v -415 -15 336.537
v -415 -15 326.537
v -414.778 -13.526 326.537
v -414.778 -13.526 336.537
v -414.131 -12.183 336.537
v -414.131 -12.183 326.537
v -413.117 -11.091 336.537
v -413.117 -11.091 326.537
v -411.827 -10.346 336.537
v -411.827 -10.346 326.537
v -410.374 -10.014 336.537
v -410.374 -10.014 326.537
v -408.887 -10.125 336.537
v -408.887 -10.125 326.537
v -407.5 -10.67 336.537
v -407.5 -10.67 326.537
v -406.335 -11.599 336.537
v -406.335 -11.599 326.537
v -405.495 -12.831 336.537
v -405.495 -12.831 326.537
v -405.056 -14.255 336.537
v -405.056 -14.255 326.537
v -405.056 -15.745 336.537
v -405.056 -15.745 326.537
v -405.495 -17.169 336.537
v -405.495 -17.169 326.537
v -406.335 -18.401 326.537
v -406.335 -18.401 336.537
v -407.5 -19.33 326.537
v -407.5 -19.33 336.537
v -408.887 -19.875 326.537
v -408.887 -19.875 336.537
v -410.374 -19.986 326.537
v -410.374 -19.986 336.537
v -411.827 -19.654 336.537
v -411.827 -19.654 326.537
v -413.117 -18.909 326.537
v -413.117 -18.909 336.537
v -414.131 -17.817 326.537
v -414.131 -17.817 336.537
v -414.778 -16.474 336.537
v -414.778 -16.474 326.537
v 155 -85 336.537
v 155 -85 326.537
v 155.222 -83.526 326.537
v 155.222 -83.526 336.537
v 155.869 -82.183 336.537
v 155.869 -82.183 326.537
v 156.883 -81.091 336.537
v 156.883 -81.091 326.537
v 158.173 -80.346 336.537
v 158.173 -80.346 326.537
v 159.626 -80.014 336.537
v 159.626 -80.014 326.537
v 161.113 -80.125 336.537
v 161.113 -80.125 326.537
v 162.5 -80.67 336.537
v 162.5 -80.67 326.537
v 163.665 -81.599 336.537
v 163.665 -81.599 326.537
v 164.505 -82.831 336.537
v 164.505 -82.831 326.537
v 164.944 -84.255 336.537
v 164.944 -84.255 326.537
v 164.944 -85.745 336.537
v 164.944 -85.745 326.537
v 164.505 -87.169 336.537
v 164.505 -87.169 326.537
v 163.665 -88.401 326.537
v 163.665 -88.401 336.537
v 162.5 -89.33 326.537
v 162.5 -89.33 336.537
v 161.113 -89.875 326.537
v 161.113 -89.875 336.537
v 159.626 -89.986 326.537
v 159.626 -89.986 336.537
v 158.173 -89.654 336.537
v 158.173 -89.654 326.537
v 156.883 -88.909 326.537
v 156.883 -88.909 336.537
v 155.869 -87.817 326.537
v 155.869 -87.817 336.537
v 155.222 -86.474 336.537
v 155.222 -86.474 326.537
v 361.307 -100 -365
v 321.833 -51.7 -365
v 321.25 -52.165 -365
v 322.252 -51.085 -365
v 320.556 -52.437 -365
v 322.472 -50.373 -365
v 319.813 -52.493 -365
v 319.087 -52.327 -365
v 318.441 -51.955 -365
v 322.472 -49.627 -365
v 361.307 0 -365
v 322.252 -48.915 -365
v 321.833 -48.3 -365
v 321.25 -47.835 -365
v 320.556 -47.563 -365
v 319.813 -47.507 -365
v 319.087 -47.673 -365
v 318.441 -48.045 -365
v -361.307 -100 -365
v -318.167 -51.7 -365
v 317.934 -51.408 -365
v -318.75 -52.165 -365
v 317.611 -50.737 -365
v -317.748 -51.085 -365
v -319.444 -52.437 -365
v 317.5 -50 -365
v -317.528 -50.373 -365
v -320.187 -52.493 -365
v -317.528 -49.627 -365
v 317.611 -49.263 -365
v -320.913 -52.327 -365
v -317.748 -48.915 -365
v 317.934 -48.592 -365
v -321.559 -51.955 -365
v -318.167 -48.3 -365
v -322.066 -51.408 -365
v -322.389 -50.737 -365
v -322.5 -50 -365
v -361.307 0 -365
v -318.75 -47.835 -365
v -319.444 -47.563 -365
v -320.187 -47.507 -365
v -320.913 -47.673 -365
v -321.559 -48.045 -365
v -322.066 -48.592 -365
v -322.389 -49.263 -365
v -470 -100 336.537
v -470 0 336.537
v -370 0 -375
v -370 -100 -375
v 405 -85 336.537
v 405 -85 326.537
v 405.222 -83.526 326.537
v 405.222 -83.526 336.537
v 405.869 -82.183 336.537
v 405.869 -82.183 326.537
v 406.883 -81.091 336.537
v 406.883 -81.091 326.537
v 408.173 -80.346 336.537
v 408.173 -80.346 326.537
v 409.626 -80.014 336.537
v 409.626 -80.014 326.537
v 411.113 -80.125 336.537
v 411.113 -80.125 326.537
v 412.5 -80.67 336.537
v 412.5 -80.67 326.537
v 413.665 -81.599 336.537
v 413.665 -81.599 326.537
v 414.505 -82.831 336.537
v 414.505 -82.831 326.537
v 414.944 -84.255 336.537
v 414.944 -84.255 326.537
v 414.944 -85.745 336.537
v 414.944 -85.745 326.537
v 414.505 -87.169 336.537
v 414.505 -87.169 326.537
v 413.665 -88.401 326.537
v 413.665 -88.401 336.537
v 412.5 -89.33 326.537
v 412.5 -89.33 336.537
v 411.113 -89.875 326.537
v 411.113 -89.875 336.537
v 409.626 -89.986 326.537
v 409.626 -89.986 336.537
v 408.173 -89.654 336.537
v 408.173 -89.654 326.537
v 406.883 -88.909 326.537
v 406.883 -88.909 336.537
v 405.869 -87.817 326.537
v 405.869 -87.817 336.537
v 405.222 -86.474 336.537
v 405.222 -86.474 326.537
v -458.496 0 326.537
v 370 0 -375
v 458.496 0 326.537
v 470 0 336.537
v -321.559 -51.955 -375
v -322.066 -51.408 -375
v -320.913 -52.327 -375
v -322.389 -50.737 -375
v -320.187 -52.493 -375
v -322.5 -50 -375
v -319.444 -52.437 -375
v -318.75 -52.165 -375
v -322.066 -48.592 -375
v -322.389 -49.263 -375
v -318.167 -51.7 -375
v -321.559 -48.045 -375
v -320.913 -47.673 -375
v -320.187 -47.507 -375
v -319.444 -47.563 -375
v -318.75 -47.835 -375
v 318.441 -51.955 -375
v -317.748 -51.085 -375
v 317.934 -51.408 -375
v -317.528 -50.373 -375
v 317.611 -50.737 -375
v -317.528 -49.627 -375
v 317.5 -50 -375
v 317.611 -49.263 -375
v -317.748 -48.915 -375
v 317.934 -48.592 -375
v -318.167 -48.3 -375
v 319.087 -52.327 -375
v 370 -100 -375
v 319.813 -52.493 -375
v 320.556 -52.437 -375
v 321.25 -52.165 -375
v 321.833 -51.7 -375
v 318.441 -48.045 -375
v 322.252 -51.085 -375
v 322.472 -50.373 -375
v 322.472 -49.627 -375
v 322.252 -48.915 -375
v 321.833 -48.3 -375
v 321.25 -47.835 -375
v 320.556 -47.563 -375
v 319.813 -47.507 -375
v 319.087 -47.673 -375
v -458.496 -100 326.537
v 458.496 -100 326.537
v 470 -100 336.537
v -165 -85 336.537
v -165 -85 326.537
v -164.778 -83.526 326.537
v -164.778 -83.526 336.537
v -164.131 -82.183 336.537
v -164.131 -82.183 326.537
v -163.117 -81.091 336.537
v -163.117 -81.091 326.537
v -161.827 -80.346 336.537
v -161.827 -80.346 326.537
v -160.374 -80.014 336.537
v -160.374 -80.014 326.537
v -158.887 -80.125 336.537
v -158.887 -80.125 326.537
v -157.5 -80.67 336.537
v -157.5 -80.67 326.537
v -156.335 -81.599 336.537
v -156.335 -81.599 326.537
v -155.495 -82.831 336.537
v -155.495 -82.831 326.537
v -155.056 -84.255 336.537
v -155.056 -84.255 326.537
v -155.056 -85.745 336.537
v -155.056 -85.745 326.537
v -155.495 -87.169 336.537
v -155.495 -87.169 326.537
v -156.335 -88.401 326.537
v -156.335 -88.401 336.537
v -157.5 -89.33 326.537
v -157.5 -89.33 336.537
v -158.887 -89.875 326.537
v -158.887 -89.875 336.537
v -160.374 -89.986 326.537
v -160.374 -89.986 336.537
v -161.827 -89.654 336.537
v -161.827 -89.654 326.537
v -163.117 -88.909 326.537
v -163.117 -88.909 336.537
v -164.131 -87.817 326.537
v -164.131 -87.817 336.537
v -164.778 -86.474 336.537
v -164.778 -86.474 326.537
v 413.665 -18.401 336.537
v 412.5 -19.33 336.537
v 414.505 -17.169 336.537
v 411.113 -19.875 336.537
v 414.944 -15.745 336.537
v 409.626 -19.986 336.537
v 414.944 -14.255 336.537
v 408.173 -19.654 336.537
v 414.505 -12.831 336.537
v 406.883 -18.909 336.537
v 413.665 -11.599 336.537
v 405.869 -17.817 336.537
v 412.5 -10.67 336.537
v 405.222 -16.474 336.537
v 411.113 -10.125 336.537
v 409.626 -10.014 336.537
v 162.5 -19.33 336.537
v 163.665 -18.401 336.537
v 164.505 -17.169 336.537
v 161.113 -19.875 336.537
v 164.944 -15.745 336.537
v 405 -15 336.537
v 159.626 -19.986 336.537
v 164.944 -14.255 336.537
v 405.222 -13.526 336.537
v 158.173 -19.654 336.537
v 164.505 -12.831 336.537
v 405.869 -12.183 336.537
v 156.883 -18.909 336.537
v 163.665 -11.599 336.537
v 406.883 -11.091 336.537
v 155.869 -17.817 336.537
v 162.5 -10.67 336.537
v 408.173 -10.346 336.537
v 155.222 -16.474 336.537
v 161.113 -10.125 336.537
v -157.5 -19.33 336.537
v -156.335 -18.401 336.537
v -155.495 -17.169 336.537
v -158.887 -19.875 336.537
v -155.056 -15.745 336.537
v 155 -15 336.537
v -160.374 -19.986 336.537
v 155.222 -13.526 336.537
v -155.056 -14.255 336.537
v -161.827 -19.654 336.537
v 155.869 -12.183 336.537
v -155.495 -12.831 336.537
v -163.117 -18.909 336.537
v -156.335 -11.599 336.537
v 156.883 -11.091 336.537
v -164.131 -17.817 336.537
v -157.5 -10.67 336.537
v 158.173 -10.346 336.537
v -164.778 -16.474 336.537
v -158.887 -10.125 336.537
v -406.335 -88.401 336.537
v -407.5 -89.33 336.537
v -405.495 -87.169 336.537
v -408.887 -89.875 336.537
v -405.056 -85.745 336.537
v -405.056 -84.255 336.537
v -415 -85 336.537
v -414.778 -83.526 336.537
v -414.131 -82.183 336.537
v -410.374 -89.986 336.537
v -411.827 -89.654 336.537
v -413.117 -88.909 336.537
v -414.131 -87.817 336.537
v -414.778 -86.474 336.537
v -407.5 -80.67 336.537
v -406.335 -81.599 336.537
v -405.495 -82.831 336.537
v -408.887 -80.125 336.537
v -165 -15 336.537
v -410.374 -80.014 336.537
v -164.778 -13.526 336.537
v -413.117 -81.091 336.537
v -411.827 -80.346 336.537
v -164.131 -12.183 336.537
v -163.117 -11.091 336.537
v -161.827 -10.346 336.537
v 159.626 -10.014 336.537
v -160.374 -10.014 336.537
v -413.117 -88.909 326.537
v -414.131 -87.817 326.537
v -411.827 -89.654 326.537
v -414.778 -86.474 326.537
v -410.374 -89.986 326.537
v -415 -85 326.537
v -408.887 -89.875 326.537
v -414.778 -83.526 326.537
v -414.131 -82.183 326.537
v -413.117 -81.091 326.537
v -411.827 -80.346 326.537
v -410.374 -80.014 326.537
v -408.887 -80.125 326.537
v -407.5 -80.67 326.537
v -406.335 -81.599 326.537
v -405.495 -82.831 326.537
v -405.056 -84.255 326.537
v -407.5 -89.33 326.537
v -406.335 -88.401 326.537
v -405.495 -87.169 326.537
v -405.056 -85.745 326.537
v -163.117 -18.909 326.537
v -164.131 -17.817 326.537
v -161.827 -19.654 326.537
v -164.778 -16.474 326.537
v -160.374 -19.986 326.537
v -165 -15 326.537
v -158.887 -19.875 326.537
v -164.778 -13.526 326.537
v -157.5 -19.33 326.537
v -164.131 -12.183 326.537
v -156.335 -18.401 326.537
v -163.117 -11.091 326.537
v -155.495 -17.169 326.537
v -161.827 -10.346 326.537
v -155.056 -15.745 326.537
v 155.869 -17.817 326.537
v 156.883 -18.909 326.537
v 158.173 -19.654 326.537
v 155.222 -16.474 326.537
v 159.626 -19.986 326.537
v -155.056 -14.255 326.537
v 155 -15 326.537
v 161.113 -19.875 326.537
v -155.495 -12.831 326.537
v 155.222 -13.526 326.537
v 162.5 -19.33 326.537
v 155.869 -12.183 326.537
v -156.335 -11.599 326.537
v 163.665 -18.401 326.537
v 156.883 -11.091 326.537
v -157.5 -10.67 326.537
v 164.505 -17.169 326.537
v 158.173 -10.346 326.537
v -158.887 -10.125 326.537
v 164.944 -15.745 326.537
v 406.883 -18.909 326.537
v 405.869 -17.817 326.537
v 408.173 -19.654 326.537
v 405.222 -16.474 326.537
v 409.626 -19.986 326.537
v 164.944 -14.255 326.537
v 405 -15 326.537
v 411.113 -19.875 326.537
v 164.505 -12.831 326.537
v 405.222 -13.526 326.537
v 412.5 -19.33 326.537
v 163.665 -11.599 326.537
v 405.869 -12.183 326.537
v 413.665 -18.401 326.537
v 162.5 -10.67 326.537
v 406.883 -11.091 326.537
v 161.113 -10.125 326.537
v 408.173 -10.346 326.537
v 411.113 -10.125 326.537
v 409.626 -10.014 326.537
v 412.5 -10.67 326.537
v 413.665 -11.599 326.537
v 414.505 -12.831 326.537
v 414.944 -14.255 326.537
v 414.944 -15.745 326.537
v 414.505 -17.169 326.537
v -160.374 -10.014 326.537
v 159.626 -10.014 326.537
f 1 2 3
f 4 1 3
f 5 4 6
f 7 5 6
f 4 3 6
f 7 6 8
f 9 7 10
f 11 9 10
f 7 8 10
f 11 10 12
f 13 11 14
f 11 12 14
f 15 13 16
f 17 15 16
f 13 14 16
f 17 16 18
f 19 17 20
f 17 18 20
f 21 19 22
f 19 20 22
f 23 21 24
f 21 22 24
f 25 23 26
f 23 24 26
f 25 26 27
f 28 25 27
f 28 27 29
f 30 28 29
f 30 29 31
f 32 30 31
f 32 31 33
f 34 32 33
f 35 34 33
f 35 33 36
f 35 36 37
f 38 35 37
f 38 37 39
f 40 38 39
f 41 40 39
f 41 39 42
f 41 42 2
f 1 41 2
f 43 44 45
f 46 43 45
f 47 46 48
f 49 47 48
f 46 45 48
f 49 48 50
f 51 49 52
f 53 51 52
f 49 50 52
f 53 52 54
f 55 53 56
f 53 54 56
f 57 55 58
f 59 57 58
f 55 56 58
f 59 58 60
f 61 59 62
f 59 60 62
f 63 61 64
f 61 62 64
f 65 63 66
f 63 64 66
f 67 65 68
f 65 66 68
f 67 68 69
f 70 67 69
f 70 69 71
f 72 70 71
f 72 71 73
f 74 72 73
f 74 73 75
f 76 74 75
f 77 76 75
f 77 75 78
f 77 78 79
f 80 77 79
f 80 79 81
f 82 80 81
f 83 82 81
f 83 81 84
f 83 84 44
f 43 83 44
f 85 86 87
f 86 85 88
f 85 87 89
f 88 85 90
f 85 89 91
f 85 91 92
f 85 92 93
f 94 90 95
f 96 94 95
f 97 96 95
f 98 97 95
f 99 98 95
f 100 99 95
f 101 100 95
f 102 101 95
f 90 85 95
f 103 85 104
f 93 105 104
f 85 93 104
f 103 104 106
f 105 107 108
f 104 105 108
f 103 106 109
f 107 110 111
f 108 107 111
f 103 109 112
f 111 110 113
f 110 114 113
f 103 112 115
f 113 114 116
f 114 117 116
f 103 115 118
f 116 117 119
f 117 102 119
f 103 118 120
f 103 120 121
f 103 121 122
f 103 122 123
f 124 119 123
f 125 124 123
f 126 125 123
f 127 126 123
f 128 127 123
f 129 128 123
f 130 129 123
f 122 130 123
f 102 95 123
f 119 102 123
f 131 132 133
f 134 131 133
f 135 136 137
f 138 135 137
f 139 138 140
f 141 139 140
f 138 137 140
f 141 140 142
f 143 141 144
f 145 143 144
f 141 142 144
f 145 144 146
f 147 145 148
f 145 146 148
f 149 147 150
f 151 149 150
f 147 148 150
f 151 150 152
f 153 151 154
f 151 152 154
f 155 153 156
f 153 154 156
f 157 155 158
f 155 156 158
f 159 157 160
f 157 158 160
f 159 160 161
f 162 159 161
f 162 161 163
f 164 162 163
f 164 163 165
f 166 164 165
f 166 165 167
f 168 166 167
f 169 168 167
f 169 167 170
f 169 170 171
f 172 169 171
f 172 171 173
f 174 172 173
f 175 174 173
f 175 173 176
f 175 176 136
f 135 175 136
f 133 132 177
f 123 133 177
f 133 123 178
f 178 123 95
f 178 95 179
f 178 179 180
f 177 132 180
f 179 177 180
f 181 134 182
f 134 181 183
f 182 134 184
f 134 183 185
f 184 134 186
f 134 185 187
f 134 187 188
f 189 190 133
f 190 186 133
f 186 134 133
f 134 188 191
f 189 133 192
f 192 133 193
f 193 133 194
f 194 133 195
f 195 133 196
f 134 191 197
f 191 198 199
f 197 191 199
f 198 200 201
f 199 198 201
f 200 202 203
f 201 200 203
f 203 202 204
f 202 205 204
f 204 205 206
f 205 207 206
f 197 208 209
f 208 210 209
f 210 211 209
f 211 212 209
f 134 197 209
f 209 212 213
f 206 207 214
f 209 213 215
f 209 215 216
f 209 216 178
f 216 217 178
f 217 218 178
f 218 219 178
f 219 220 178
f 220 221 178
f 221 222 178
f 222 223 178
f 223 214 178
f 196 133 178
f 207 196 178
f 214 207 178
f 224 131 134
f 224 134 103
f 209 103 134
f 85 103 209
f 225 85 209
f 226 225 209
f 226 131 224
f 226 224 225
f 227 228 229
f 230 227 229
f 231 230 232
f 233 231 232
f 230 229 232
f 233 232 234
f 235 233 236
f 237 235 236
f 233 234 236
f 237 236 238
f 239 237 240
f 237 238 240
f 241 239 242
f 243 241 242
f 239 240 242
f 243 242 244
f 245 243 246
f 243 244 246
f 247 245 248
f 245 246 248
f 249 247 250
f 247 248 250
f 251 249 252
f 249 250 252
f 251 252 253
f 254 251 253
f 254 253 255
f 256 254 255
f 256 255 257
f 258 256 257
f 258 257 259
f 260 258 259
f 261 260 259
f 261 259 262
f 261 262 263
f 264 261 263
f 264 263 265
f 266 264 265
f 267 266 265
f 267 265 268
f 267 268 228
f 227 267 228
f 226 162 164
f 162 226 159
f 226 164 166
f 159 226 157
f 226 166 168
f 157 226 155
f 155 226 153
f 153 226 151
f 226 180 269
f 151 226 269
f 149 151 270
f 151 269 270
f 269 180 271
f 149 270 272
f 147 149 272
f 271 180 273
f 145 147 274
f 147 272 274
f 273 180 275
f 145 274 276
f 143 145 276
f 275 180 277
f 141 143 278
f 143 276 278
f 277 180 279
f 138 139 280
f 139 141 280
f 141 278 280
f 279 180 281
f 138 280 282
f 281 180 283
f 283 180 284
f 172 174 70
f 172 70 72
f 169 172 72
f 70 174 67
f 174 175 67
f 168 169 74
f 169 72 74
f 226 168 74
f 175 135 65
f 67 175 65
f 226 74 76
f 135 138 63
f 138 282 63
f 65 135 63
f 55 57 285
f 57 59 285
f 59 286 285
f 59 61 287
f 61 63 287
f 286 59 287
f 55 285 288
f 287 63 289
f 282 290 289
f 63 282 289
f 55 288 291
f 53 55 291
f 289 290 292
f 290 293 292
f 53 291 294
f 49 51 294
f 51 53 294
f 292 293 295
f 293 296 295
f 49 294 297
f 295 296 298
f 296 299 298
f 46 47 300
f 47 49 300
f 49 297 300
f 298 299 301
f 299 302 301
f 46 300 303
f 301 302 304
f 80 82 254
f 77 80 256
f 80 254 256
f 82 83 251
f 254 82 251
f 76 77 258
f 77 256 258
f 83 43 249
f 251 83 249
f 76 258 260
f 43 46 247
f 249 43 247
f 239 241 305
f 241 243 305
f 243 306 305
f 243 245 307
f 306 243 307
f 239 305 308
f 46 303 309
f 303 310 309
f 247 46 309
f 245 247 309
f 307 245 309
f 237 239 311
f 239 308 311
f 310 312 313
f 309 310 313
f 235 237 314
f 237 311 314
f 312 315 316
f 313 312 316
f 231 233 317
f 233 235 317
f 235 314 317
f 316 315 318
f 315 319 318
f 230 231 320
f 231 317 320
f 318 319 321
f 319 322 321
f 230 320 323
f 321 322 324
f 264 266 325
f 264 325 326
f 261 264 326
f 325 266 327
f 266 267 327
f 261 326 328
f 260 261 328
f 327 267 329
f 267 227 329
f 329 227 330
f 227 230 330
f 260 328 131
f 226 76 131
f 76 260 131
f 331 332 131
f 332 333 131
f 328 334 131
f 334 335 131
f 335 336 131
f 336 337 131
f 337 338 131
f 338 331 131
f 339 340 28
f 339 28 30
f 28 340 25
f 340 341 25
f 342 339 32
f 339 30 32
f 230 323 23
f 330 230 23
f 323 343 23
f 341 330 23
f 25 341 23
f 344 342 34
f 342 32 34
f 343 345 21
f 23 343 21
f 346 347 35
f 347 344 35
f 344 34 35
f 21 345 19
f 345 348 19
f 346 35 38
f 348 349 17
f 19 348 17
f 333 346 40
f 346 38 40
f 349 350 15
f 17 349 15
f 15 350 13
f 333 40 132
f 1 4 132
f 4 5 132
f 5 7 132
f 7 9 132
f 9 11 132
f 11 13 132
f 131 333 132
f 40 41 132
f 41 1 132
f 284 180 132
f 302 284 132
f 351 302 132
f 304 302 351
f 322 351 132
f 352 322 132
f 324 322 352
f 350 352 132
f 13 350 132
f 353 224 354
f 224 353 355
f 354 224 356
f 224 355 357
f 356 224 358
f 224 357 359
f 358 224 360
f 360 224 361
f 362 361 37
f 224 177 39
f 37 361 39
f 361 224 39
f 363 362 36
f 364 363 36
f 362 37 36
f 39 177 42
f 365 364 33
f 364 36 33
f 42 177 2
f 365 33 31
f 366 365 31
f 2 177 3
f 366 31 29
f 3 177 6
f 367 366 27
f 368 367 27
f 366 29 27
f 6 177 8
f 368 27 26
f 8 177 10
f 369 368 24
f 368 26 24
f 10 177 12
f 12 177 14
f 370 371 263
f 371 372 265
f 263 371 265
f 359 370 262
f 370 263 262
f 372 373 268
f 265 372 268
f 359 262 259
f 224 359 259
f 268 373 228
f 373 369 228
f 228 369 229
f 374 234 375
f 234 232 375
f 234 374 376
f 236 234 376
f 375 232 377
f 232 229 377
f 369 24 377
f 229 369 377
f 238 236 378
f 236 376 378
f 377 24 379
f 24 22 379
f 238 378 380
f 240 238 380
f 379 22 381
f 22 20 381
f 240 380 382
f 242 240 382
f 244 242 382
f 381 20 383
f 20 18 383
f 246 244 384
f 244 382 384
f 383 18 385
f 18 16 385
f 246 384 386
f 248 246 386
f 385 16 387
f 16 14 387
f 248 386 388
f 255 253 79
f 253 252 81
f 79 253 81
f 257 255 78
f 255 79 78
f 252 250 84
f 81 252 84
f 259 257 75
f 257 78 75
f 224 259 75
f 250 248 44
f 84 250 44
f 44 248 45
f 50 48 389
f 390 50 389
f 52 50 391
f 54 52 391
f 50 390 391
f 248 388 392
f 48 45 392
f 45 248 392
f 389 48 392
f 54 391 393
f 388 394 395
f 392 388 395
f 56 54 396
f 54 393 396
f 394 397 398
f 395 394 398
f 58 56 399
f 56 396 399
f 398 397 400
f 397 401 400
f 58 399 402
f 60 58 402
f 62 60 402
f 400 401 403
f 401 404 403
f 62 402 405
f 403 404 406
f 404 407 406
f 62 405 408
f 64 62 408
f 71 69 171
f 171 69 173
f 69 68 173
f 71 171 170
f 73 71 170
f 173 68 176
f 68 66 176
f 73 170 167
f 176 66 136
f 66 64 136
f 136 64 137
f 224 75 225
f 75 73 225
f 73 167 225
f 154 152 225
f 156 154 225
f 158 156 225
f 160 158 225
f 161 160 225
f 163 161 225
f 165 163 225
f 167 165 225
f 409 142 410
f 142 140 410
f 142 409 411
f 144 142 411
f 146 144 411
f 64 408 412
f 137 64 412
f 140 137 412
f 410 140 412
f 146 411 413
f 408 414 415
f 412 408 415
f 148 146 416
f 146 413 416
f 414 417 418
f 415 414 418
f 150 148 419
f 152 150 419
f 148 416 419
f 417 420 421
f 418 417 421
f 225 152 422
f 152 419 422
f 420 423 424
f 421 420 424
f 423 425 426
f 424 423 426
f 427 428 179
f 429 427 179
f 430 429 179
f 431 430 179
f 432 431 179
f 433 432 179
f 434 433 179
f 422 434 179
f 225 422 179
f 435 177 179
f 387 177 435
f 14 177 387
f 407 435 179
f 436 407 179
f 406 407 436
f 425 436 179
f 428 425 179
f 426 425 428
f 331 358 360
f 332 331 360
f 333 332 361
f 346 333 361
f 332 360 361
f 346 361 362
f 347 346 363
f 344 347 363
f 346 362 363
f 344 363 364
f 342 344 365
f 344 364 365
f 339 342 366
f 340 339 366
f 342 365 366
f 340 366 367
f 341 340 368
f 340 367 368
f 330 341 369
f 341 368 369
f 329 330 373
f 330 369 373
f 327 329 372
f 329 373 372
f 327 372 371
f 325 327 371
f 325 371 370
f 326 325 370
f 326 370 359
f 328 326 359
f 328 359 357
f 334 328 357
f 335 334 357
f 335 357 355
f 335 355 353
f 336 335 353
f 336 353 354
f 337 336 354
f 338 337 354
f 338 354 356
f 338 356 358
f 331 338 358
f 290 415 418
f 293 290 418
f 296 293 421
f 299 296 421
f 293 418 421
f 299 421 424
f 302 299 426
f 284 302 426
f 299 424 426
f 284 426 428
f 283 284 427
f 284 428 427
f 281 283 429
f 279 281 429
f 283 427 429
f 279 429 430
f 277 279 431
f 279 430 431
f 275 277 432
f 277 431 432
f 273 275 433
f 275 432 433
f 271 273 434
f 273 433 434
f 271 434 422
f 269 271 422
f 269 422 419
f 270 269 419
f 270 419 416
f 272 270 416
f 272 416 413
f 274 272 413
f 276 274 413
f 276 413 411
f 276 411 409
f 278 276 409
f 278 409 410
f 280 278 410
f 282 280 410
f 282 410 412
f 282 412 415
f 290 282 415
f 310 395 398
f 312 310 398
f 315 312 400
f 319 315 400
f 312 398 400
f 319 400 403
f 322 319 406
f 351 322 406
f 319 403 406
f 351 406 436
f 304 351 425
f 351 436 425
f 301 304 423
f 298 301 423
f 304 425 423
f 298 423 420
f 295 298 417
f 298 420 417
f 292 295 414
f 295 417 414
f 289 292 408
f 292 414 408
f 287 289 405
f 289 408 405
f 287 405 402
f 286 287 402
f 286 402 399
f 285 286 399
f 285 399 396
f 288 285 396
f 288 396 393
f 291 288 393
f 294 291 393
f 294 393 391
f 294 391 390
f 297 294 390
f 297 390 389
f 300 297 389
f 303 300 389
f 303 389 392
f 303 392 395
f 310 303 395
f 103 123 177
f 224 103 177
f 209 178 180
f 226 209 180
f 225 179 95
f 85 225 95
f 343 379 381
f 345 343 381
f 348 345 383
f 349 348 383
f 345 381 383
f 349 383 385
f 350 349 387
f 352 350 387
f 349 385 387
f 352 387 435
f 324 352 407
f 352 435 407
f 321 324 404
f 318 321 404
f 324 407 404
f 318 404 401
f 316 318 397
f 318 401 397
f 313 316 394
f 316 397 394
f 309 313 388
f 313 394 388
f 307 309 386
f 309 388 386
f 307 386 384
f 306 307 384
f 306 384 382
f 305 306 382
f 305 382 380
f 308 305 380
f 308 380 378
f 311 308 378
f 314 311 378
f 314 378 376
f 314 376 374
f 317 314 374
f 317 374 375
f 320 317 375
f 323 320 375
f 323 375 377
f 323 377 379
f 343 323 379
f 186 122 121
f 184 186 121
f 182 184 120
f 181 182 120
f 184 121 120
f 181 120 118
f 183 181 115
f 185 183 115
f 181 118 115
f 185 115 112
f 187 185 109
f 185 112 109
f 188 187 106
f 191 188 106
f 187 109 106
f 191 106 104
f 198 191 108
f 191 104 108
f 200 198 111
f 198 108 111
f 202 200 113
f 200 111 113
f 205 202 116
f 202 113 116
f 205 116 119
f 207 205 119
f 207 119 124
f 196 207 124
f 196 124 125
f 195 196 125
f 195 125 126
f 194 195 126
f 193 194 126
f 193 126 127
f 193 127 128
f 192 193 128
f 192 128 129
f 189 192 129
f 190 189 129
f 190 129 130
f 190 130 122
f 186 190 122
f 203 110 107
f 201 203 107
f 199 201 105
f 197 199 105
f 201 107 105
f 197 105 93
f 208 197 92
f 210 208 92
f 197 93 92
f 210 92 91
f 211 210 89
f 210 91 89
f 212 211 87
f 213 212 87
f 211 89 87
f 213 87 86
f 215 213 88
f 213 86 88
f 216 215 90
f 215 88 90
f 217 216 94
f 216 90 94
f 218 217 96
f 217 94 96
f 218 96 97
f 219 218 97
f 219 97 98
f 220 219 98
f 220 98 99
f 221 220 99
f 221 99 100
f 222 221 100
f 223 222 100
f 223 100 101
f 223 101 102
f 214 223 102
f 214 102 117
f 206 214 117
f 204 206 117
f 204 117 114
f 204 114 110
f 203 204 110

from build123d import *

# Parameters (mm, degrees)
F1_DEPTH = 100
F3_D     = 5
F3_DEPTH = 15
F3_TIP   = 1.5021515476
F5_D     = 10
F5_DEPTH = 15
F5_TIP   = 3.0043030951


with BuildPart() as f1:
    # F0 (on Front) → F1 (new body)
    with BuildSketch(Plane.XZ):
        Polygon((470, 336.5369722384), (-470, 336.5369722384), (-370, -375), (370, -375), align=None)
        Polygon((-458.4963159278, 326.5369722384), (458.4963159278, 326.5369722384), (361.3071326218, -365), (-361.3071326218, -365), align=None, mode=Mode.SUBTRACT)
    extrude(amount=F1_DEPTH)

    # F3
    with Locations(Plane(origin=(0, 0, -375), x_dir=(1, 0, 0), z_dir=(0, 0, -1))):
        with Locations((-320, 50), (320, 50)):
            Hole(F3_D / 2, depth=F3_DEPTH)
            with Locations((0, 0, -(F3_DEPTH + F3_TIP / 2))):  # 118° drill point
                Cone(0, F3_D / 2, F3_TIP, mode=Mode.SUBTRACT)

    # F5
    with Locations(Plane.XY.offset(336.5369722384)):
        with Locations((-410, -15), (-410, -85), (-160, -15), (-160, -85), (160, -85), (160, -15), (410, -15), (410, -85)):
            Hole(F5_D / 2, depth=F5_DEPTH)
            with Locations((0, 0, -(F5_DEPTH + F5_TIP / 2))):  # 118° drill point
                Cone(0, F5_D / 2, F5_TIP, mode=Mode.SUBTRACT)


solid = f1.part
